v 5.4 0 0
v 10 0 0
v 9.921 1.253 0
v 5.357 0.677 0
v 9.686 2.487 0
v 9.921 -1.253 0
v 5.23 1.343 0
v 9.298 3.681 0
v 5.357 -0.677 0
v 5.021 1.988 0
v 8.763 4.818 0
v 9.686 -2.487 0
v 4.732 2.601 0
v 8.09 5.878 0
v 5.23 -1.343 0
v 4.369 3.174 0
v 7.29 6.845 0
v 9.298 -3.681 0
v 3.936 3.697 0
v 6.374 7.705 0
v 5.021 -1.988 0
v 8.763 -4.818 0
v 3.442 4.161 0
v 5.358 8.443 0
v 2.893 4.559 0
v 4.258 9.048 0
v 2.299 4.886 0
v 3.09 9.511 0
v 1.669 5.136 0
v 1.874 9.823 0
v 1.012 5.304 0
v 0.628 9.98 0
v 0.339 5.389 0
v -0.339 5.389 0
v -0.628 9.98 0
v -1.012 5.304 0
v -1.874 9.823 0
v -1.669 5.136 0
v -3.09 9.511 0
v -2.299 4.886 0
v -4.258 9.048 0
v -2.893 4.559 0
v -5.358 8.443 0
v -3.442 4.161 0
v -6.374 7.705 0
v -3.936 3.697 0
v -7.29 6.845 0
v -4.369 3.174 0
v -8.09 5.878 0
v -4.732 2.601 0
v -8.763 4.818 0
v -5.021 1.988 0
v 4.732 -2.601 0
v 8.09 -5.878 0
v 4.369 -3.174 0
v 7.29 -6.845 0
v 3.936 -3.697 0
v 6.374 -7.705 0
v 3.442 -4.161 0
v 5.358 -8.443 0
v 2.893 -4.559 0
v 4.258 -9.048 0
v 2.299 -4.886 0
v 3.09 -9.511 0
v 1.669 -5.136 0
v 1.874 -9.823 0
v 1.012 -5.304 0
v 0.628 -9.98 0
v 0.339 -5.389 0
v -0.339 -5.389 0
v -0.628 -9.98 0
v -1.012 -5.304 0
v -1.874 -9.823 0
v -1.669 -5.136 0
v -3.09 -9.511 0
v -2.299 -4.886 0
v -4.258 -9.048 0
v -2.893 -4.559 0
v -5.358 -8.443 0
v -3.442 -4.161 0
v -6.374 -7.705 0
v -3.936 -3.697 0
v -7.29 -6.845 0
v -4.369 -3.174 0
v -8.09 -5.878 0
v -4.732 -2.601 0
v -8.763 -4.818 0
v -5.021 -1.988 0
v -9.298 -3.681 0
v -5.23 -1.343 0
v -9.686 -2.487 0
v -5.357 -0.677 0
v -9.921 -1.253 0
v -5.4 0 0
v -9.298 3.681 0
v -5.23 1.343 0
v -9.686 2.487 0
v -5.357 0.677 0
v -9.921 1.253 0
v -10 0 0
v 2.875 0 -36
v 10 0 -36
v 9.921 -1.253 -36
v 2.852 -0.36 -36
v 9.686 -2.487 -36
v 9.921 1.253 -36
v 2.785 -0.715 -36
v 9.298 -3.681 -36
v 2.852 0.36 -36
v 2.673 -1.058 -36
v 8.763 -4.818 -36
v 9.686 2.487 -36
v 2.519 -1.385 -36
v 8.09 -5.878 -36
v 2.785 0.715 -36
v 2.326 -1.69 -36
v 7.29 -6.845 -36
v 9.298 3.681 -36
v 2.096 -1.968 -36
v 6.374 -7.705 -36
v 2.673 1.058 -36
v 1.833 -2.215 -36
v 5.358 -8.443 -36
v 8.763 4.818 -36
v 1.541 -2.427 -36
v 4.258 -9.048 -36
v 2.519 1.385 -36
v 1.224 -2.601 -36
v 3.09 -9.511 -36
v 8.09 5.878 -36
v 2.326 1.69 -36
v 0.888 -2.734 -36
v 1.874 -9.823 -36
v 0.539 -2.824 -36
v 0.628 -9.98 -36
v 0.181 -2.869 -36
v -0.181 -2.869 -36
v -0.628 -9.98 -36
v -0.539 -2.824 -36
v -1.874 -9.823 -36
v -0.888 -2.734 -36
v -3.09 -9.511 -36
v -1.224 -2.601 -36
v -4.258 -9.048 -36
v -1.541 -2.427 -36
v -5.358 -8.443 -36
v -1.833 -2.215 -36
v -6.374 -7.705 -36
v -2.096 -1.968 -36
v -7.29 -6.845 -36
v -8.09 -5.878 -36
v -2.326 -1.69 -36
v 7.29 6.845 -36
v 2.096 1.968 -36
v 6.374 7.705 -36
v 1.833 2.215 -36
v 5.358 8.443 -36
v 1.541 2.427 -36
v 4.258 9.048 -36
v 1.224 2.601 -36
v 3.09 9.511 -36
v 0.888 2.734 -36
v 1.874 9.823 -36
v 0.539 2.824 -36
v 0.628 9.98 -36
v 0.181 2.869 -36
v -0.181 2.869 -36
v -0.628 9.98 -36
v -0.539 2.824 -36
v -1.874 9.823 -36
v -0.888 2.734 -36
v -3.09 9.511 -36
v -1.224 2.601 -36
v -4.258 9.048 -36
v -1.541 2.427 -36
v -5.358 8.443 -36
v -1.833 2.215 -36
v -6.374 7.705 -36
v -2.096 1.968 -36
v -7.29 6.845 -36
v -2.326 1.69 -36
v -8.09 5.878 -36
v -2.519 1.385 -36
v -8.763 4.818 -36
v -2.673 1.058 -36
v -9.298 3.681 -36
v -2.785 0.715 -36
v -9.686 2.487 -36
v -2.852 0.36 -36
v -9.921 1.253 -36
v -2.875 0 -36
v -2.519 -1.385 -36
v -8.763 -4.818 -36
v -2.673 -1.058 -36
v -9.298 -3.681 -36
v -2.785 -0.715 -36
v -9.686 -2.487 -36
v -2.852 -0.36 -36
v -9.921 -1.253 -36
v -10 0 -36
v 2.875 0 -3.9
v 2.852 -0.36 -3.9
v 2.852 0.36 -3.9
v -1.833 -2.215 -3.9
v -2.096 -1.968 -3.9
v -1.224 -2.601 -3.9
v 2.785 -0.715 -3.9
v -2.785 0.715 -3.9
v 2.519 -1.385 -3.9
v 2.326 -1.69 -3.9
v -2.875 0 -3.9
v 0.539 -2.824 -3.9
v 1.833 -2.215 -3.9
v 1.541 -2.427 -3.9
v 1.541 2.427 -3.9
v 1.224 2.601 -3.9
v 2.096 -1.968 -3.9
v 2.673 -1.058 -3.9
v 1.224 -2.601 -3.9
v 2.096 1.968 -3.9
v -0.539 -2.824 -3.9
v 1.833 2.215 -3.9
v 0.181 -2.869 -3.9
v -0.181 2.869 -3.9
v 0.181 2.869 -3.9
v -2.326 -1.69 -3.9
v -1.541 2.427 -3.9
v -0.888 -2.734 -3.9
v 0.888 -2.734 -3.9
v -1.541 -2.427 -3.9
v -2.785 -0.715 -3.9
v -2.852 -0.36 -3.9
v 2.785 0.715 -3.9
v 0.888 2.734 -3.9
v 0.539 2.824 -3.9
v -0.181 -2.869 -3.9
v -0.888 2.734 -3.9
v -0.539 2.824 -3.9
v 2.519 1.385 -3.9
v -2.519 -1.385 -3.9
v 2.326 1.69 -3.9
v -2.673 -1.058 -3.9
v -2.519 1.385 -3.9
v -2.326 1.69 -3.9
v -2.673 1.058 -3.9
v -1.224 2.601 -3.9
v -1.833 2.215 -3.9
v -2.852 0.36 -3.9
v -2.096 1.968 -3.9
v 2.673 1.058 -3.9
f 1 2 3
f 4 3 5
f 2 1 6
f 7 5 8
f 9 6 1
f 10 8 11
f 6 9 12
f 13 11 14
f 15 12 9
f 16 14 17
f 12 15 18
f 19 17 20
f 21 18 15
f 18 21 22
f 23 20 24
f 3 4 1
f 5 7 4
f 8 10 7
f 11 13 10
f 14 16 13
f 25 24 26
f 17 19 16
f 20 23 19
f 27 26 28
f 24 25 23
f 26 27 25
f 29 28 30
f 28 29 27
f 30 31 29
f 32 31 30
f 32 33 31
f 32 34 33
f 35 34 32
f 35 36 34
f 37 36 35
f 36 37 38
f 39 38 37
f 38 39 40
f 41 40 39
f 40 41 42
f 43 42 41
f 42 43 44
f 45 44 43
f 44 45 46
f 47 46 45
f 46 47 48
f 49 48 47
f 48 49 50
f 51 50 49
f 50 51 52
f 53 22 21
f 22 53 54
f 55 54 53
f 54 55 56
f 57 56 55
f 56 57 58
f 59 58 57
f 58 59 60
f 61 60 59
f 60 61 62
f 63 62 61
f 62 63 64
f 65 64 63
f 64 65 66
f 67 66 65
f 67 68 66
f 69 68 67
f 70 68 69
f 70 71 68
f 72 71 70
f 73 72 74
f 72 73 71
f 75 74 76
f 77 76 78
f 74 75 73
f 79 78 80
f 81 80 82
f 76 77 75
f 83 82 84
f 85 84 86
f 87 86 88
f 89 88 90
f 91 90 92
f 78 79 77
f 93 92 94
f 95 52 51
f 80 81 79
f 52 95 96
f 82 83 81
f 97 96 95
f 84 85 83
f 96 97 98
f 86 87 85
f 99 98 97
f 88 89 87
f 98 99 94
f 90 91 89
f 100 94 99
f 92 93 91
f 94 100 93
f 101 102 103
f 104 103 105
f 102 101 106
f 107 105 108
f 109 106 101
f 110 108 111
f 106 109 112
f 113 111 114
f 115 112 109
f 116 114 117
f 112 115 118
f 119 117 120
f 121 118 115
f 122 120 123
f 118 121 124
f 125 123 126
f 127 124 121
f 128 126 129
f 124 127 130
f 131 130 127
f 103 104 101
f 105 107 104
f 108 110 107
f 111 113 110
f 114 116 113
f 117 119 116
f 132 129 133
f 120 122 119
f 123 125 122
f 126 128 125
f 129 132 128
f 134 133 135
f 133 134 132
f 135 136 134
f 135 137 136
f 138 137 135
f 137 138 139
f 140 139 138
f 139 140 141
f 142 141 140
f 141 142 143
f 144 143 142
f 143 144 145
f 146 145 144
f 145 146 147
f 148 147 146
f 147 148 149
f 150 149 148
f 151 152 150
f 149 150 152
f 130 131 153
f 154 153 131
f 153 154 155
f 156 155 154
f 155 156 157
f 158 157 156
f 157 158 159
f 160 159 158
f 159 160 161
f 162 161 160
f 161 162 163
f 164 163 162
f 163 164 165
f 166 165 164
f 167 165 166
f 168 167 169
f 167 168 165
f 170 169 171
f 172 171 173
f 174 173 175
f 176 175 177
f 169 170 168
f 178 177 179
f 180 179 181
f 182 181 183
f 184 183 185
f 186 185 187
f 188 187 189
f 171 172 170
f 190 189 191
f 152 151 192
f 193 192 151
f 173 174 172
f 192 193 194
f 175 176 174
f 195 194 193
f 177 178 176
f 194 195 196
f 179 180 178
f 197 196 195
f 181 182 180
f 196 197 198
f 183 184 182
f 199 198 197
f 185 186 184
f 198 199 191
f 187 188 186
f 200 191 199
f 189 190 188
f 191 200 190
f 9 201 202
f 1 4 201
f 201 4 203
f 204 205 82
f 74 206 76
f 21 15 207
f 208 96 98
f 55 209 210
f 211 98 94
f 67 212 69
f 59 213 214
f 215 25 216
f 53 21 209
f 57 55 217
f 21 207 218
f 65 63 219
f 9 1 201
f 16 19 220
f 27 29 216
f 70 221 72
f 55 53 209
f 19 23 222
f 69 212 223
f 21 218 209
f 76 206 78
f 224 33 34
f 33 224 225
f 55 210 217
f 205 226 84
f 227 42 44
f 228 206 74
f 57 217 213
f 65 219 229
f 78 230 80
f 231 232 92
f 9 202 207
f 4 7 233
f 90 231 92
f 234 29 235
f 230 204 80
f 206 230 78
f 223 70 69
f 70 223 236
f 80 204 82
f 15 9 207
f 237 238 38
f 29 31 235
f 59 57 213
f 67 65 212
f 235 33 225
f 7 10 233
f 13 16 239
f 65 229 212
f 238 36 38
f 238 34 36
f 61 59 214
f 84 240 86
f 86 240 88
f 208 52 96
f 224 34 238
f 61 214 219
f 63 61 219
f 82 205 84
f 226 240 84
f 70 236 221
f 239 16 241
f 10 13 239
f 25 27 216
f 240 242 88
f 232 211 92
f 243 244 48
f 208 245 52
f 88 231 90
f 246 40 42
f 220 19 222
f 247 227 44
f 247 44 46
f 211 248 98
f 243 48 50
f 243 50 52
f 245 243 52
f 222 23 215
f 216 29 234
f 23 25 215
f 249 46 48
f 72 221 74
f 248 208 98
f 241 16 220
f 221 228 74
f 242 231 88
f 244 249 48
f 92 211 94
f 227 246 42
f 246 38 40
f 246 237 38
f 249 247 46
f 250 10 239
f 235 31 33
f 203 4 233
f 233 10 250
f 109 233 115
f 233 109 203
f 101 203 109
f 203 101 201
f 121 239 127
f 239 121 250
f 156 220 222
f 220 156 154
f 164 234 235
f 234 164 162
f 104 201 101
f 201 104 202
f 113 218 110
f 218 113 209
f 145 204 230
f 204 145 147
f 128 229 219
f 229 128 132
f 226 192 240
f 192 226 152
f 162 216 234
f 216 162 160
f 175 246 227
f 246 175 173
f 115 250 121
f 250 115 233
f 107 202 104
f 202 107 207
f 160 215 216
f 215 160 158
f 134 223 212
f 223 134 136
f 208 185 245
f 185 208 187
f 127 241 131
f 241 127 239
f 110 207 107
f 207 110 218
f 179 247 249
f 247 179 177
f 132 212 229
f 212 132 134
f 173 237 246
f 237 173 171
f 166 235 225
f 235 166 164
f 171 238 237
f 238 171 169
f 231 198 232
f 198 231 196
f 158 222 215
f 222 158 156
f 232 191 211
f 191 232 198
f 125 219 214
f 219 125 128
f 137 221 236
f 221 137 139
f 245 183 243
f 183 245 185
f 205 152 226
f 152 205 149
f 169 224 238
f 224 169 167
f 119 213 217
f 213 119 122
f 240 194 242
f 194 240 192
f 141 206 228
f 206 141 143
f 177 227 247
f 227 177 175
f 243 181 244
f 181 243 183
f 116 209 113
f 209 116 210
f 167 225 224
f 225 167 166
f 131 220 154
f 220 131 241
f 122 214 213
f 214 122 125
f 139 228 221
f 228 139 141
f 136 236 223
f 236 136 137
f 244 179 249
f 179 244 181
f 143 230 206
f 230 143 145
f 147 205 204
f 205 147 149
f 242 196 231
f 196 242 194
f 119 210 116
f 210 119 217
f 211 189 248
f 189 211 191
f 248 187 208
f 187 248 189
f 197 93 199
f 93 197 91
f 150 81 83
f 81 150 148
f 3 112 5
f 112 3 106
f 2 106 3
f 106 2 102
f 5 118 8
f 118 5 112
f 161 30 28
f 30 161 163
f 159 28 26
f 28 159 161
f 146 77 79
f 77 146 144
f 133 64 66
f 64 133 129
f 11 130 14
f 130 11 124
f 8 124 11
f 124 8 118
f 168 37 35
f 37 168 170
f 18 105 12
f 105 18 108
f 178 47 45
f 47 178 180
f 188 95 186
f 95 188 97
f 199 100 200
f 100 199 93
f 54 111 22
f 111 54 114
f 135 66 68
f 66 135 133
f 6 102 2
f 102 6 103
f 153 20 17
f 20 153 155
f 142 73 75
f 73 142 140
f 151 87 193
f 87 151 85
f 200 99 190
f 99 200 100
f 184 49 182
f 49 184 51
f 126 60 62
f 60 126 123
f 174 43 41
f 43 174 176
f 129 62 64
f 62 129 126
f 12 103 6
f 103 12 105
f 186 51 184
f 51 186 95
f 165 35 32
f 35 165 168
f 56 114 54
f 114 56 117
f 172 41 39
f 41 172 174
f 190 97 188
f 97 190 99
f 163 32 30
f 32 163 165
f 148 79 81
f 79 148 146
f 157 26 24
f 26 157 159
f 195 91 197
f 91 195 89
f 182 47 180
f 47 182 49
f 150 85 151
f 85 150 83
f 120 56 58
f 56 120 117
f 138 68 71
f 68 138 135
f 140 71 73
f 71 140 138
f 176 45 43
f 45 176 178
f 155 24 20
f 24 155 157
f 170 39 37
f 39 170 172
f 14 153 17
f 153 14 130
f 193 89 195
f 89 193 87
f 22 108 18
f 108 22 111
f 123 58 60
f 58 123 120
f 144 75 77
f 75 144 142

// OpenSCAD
$fn = 50;


difference() {
	union() {
		translate(v = [0, 0, -36.0000000000]) {
			cylinder(h = 36, r = 10.0000000000);
		}
		cylinder(h = 0, r = 16.0000000000);
	}
	union() {
		translate(v = [0, 0, 0]) {
			rotate(a = [0, 0, 0]) {
				difference() {
					union() {
						#translate(v = [0, 0, -36.0000000000]) {
							cylinder(h = 36, r = 2.6000000000);
						}
						#translate(v = [0, 0, -3.9000000000]) {
							cylinder(h = 3.9000000000, r = 10.0000000000, r1 = 2.8750000000, r2 = 5.4000000000);
						}
						#translate(v = [0, 0, -36.0000000000]) {
							cylinder(h = 36, r = 2.8750000000);
						}
						#translate(v = [0, 0, -36.0000000000]) {
							cylinder(h = 36, r = 2.6000000000);
						}
					}
					union();
				}
			}
		}
	}
}
